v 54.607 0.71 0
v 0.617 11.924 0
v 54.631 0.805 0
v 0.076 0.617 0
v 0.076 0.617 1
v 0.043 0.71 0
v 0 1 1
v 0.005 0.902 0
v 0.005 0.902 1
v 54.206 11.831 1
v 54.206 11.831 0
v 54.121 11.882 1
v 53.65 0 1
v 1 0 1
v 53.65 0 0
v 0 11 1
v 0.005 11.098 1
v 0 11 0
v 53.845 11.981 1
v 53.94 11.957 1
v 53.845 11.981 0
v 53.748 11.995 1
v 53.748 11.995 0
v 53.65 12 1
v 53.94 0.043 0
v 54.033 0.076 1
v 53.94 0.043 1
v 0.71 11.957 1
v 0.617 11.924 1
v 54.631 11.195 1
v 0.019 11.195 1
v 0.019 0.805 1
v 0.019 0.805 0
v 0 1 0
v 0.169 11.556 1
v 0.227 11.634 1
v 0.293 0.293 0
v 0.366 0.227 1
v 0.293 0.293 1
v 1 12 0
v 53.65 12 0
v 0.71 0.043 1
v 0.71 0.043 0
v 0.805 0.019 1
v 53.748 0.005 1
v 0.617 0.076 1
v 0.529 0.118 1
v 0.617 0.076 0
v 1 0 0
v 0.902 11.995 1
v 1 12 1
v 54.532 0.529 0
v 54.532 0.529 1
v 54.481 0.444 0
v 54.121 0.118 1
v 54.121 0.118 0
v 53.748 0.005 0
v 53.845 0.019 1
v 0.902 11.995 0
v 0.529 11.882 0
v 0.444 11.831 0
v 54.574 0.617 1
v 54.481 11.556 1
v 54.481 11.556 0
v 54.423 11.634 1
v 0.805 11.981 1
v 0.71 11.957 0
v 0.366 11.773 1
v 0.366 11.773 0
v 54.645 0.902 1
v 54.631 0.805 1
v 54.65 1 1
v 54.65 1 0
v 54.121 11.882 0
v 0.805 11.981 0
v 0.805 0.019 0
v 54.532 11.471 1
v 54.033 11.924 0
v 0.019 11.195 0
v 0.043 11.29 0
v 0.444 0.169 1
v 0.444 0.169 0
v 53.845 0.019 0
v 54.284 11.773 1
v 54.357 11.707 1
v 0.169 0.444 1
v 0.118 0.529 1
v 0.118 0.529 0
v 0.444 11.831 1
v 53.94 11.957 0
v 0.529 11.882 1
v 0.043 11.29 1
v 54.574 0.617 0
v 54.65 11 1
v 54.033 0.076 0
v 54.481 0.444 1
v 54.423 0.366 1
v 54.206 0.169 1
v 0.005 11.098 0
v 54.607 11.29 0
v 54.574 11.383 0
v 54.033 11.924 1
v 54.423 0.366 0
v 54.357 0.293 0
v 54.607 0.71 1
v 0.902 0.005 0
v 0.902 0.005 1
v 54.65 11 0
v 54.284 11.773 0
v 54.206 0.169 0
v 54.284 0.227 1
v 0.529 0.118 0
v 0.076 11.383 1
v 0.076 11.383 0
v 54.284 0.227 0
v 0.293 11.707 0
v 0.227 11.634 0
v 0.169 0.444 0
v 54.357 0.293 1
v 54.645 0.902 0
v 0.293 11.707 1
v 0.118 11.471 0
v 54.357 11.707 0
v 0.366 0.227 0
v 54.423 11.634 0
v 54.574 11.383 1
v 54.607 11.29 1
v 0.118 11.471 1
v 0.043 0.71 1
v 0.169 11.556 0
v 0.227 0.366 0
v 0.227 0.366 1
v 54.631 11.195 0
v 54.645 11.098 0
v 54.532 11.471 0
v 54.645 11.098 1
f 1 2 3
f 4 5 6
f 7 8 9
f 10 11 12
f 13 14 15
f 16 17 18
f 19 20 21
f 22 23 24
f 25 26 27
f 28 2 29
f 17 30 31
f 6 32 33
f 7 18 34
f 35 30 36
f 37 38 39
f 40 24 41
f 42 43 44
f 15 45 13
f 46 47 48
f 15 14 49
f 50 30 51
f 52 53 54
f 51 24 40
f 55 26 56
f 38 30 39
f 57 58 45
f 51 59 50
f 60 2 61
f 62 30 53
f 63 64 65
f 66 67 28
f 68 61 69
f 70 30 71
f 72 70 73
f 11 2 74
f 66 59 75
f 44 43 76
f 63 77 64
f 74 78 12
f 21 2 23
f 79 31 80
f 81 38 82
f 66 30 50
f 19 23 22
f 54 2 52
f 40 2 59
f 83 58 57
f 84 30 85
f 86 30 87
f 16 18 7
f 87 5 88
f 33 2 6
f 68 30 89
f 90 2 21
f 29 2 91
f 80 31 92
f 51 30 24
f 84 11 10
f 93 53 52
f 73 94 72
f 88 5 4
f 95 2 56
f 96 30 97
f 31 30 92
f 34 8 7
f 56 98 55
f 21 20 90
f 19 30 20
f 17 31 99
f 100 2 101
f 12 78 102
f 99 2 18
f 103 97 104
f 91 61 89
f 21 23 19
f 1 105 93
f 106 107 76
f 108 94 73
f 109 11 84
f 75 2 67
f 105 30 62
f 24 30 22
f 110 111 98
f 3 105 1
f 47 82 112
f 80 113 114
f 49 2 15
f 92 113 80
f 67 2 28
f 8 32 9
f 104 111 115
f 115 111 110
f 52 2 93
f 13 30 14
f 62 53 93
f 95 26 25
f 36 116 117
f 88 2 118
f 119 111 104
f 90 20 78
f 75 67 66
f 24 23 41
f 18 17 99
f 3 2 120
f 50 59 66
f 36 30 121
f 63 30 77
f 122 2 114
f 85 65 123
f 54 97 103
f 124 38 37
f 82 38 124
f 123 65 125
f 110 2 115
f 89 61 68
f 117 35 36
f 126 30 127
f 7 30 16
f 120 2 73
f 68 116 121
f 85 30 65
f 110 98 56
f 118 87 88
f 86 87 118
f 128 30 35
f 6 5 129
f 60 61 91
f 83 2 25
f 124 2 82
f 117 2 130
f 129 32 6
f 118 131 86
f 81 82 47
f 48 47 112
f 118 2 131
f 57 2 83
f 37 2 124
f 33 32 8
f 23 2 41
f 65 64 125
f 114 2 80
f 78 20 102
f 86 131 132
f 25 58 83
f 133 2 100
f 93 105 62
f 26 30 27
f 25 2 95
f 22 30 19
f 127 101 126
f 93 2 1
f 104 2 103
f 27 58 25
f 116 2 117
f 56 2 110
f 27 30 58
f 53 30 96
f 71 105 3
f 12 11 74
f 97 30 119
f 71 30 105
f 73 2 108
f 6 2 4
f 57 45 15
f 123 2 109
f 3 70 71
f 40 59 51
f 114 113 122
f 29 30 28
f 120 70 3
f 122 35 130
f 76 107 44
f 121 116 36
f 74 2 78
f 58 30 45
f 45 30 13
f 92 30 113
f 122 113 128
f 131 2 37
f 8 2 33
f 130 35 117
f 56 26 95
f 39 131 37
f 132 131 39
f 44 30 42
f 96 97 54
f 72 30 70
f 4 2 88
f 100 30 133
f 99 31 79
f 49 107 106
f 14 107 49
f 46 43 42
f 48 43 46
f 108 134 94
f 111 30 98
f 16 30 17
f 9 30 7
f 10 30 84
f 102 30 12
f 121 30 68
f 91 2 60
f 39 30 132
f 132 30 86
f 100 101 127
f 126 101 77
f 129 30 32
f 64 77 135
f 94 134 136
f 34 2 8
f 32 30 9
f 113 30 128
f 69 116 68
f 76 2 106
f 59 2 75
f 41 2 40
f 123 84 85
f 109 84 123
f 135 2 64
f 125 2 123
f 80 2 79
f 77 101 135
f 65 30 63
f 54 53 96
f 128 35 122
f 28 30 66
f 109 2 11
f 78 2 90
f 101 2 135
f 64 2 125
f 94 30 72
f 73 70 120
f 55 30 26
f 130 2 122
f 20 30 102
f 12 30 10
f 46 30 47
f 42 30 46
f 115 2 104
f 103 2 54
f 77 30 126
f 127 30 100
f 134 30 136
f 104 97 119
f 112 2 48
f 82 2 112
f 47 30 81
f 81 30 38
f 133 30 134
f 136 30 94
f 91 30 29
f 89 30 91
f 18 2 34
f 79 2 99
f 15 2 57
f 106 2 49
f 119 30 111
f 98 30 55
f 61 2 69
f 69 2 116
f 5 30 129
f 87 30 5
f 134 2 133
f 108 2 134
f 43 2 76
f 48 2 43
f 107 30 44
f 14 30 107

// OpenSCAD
// file: ../generated/config.scad
// GENERATED by tools/build.py from config/rack.yaml — do not edit.

FRAME_W = 670.6;
FRAME_D = 225.335;
FRAME_TILT = 20;
FRAME_ROW_Y0 = 25;
FRAME_BASE_H = 80;
FRAME_TOP_Z = 410;
FRAME_PANEL_T = 7.4;
FRAME_PANEL_CLEAR = 0.2;
ROW_IDS = ["A", "B"];
ROW_HEIGHTS = [165, 165];
ROW_LAYOUTS = [[1, 1, 1, 1], [1, 1, 1, 1]];
BAY_PITCH = 165.8;
CARRIER_W = 158;
CARRIER_D = 210;
CARRIER_BOTTOM = 2.5;
CARRIER_WALL = 2;
CARRIER_STANDOFF = 5;
CARRIER_DECK = 3;
CARRIER_FASCIA = 2.5;
CARRIER_WALL_H = 20.1;
CARRIER_PLENUM = 23.1;
PCB_TO_FLOOR = 14;
CAM_MOUNT = [109, 45, 30];
CAM_LENS = [64, 27.6];
DRAWER_D = 208;
DRAWER_W = 142;
DRAWER_X0 = 8;
DRAWER_TRAVEL = 140;
DRAWER_GUIDE_W = 7.5;
DRAWER_CLEAR = 0.5;
DRAWER_BOTTOM = 2.5;
DRAWER_WALL = 2;
DRAWER_WALL_H = 16;
DRAWER_FRONT_H = 41;
DRAWER_FRONT_T = 4;
DRAWER_PLATE_GAP = [0.3, 3.2];
DISPLAY_GLASS = [52.36, 28.8];
DISPLAY_PCB = [51, 26.6];
DISPLAY_AT = [82, 8.5];
DISPLAY_SH = [12.3, 25.8];
DISPLAY_FIT = [0.3, 8.6, 3.5, 2];
DISPLAY_FRAME = [2.2, 2.5];
DRAWER_REAR_BAY = 42;
DRAWER_FLANGE = [3, 3];
DRAWER_MAGNET = [6, 3];
DRAWER_DETENT = "printed";
DATA_PORT_X = [80];
PLATE_T = 5;
HEX_PITCH = 10;
HEX_AF = 7.2;
HEX_U = 0.4;
HEX_CLEAR = 0.1;
HEX_HOLES = [[22.25, 10.418], [32.25, 10.418], [42.25, 10.418], [52.25, 10.418], [62.25, 10.418], [72.25, 10.418], [82.25, 10.418], [92.25, 10.418], [102.25, 10.418], [112.25, 10.418], [122.25, 10.418], [7.25, 19.078], [17.25, 19.078], [27.25, 19.078], [37.25, 19.078], [47.25, 19.078], [57.25, 19.078], [67.25, 19.078], [77.25, 19.078], [87.25, 19.078], [97.25, 19.078], [107.25, 19.078], [117.25, 19.078], [127.25, 19.078], [12.25, 27.738], [22.25, 27.738], [32.25, 27.738], [42.25, 27.738], [52.25, 27.738], [62.25, 27.738], [72.25, 27.738], [82.25, 27.738], [92.25, 27.738], [102.25, 27.738], [112.25, 27.738], [122.25, 27.738], [7.25, 36.399], [17.25, 36.399], [27.25, 36.399], [37.25, 36.399], [47.25, 36.399], [57.25, 36.399], [67.25, 36.399], [77.25, 36.399], [87.25, 36.399], [97.25, 36.399], [107.25, 36.399], [117.25, 36.399], [127.25, 36.399], [12.25, 45.059], [22.25, 45.059], [32.25, 45.059], [42.25, 45.059], [52.25, 45.059], [62.25, 45.059], [72.25, 45.059], [82.25, 45.059], [92.25, 45.059], [102.25, 45.059], [112.25, 45.059], [122.25, 45.059], [7.25, 53.719], [17.25, 53.719], [27.25, 53.719], [37.25, 53.719], [47.25, 53.719], [57.25, 53.719], [67.25, 53.719], [77.25, 53.719], [87.25, 53.719], [97.25, 53.719], [107.25, 53.719], [117.25, 53.719], [127.25, 53.719], [22.25, 62.379], [32.25, 62.379], [42.25, 62.379], [52.25, 62.379], [62.25, 62.379], [72.25, 62.379], [82.25, 62.379], [92.25, 62.379], [102.25, 62.379], [112.25, 62.379], [122.25, 62.379], [27.25, 71.04], [37.25, 71.04], [47.25, 71.04], [57.25, 71.04], [67.25, 71.04], [77.25, 71.04], [87.25, 71.04], [97.25, 71.04], [107.25, 71.04], [32.25, 79.7], [42.25, 79.7], [52.25, 79.7], [62.25, 79.7], [72.25, 79.7], [82.25, 79.7], [92.25, 79.7], [102.25, 79.7], [27.25, 88.36], [37.25, 88.36], [47.25, 88.36], [57.25, 88.36], [67.25, 88.36], [77.25, 88.36], [87.25, 88.36], [97.25, 88.36], [107.25, 88.36], [12.25, 97.021], [22.25, 97.021], [32.25, 97.021], [42.25, 97.021], [52.25, 97.021], [62.25, 97.021], [72.25, 97.021], [82.25, 97.021], [92.25, 97.021], [102.25, 97.021], [112.25, 97.021], [122.25, 97.021], [7.25, 105.681], [17.25, 105.681], [27.25, 105.681], [37.25, 105.681], [47.25, 105.681], [57.25, 105.681], [67.25, 105.681], [77.25, 105.681], [87.25, 105.681], [97.25, 105.681], [107.25, 105.681], [117.25, 105.681], [127.25, 105.681], [12.25, 114.341], [22.25, 114.341], [32.25, 114.341], [42.25, 114.341], [52.25, 114.341], [62.25, 114.341], [72.25, 114.341], [82.25, 114.341], [92.25, 114.341], [102.25, 114.341], [112.25, 114.341], [122.25, 114.341], [7.25, 123.001], [17.25, 123.001], [27.25, 123.001], [37.25, 123.001], [47.25, 123.001], [57.25, 123.001], [67.25, 123.001], [77.25, 123.001], [87.25, 123.001], [97.25, 123.001], [107.25, 123.001], [117.25, 123.001], [127.25, 123.001], [12.25, 131.662], [22.25, 131.662], [32.25, 131.662], [42.25, 131.662], [52.25, 131.662], [62.25, 131.662], [72.25, 131.662], [82.25, 131.662], [92.25, 131.662], [102.25, 131.662], [112.25, 131.662], [122.25, 131.662], [7.25, 140.322], [17.25, 140.322], [27.25, 140.322], [37.25, 140.322], [47.25, 140.322], [57.25, 140.322], [67.25, 140.322], [77.25, 140.322], [87.25, 140.322], [97.25, 140.322], [107.25, 140.322], [117.25, 140.322], [127.25, 140.322], [12.25, 148.982], [22.25, 148.982], [32.25, 148.982], [42.25, 148.982], [52.25, 148.982], [62.25, 148.982], [72.25, 148.982], [82.25, 148.982], [92.25, 148.982], [102.25, 148.982], [112.25, 148.982]];
HEX_ROWS = [[1, 10.418], [2, 19.078], [3, 27.738], [4, 36.399], [5, 45.059], [6, 53.719], [7, 62.379], [8, 71.04], [9, 79.7], [10, 88.36], [11, 97.021], [12, 105.681], [13, 114.341], [14, 123.001], [15, 131.662], [16, 140.322], [17, 148.982]];
PEG_STOP = [3.55, 15, 4.6, 7, 7.6];
PEG_CAM = [3, 6.75, 270, 20];
CHAIN_INNER = [7, 7];
CHAIN_OUTER = [13.5, 10.2];
CHAIN_R = 18;
CHAIN_PITCH = 16;
CHAIN_END_HOLES = [8, 4];
CHAIN_FIXED = [100, 87];
CHAIN_MOVING_X = 136;
CHAIN_FOOT_Y = 172;
CHAIN_MOVING_Y = 157;
CHAIN_END_LENGTH = 26;
CHAIN_BEND_Y = 183;
NODE_SIZE = [74, 90];
NODE_T = 1.6;
NODE_HOLES = [[3.5, 13.5], [70.5, 13.5], [3.5, 86.5], [70.5, 86.5]];
NODE_X0 = 4;
NODE_FRONT_Y = 3;
NODE_PCB_TOP = 9.1;
NODE_FRONT = [32, 12, 50];
NODE_PWR_Y = 73;
NODE_DATA_Y = 30;
NODE_AUX = [69.1, 50.6];
NODE_CAM = [59, 17.2];
DATA_PCB_SIZE = [40, 17];
DATA_PCB_T = 1.6;
DATA_PCB_HOLES = [[2.6, 13.5], [37.5, 4]];
DATA_PCB_USB = 30.5;
DATA_PCB_PH = 14.4;
DATA_X4_SIZE = [100, 37];
DATA_X4_X0 = 15;
DATA_X4_HOLES = [[3.2, 16.5], [38.7, 16.5], [81.4, 16.3]];
DATA_X4_USB = [11, 29, 47, 65];
DATA_X4_LEAD = [95.1, 20];
POD_PCB_SIZE = [40, 27];
POD_PCB_T = 1.6;
POD_PCB_HOLES = [[2.6, 13], [26.5, 23.5]];
POD_LEDS = [5, 11, 17, 23];
POD_LED_Y = 3.2;
POD_LEAD_Y = 13;
POD_HEADER = [13, 21];
HUB_SIZE = [76, 100];
HUB_HOLES = [[3.5, 3.5], [72, 4], [4, 93.5], [72, 86]];
HUB_T = 1.6;
HUB_X0 = 3.6;
HUB_FRONT_GAP = 1.2;
HUB_Z = 19;
HUB_ROWS = [81, 63.5, 46, 28.5];
HUB_LEDS = [11, 23, 35, 47, 55.6, 61.6];
HUB_USB = 70;
HUB_PD = 62;
HUB_BUTTONS = [[11.5, 10], [11.5, 16.5]];
PBOX_COLUMN = 0;
PBOX_SIZE = [84, 108, 35];
PBOX_WALL = 2.4;
PBOX_X = 3;
SA_PD = [30, 21, 1.6, 3.2];
SA_FEET = [10, 3];
// file: ../lib/common.scad
// Shared helpers for every printed part of hw-testing-rack.
include <../generated/config.scad>

$fn = $preview ? 32 : 64;
EPS = 0.01;

// Heat-set inserts (Ruthex-style).  Hole Ø is the recommended pre-hole.
INSERT_M3 = [4.0, 5.7];    // [hole Ø, depth]
INSERT_M2 = [3.2, 4.0];
INSERT_M25 = [3.6, 4.5];
M3_CLEAR = 3.4;
M5_CLEAR = 5.5;
M3_HEAD = [6.0, 3.0];      // DIN 912 / ISO 7380 head Ø × height (button head ~5.7)
// The rack's four screw types (docs/printed-parts-review.md, finding 13): M3 × 8 into inserts, nuts and
// spacers; PT 2.3 × 8 thread-forming into printed pilots; the M3 spacers; M2.5 washers
PT_PILOT = 1.9;            // a PT 2.3's pilot (≈ 0.8 × d)
PT_CLEAR = 2.6;            // and its clearance hole

module rbox(size, r = 2, center = false) {
    // Box with rounded vertical edges.
    translate(center ? [-size[0] / 2, -size[1] / 2, 0] : [0, 0, 0])
        hull() for (x = [r, size[0] - r], y = [r, size[1] - r])
            translate([x, y, 0]) cylinder(r = r, h = size[2]);
}

module rslot(len, w, h) {
    // Stadium-shaped slot along X, centred on the origin.
    hull() for (x = [-(len - w) / 2, (len - w) / 2]) translate([x, 0, 0]) cylinder(d = w, h = h);
}

module insert_hole(spec = INSERT_M3, runout = 0) {
    // Pocket for a heat-set insert, opening at z=0 and going -Z; `runout`: an M3 clearance hole that
    // carries on past it, so an M3 × 8 that goes deeper than the insert doesn't bottom on the plastic
    translate([0, 0, -spec[1]]) cylinder(d = spec[0], h = spec[1] + EPS);
    translate([0, 0, -0.6]) cylinder(d1 = spec[0], d2 = spec[0] + 0.8, h = 0.6 + EPS);
    if (runout > 0) translate([0, 0, -spec[1] - runout]) cylinder(d = M3_CLEAR, h = runout + EPS);
}

module screw_through(d = M3_CLEAR, h = 20, head = M3_HEAD, counterbore = true) {
    // Clearance hole along +Z from z=0, with an optional counterbore at z=h.
    translate([0, 0, -EPS]) cylinder(d = d, h = h + 2 * EPS);
    if (counterbore) translate([0, 0, h - head[1]]) cylinder(d = head[0] + 0.4, h = head[1] + EPS);
}

module magnet_pocket(d = DRAWER_MAGNET[0], t = DRAWER_MAGNET[1]) {
    // Slip-fit pocket for a glued disc magnet (docs/mechanical.md), opening at z=0 going -Z.
    translate([0, 0, -t - 0.2]) cylinder(d = d + 0.25, h = t + 0.2 + EPS);
}

module label_text(txt, size = 6, depth = 0.6, font = "Liberation Sans:style=Bold") {
    linear_extrude(depth) text(txt, size = size, font = font, halign = "center", valign = "center");
}


// ---------------------------------------------------------------- the visual language
// One set of rules for every part (docs/printed-parts-review.md › The visual language): R3 on the outer
// vertical edges of big parts, R1.5 on small ones; a 0.5 × 45° chamfer on the visible bed edges (it hides the
// elephant's foot); a 0.8 round on free top edges; text debossed 0.6 mm in Liberation Sans Bold, capitals at
// least 4.5 mm on a horizontal face, 5.5 on a vertical one.
VL_R = [3, 1.5];
VL_CHAMFER = 0.5;
VL_FILLET = 0.8;
VL_DEPTH = 0.6;
function vl_size(cap) = cap / 0.955;      // OpenSCAD's text size for a capital height (Liberation Sans Bold)

// cutters for a straight edge along +X from the origin, `len` long, between the faces y = 0 and z = 0 with
// the material at y >= 0, z >= 0: a 45° chamfer c, or a round of radius r.  Rotate / mirror them onto an edge
module edge_chamfer(len, c = VL_CHAMFER) translate([-EPS, 0, 0]) rotate([90, 0, 90]) linear_extrude(len + 2 * EPS)
    polygon([[-1, -1], [c, -1], [c, -EPS], [-EPS, c], [-1, c]]);
module edge_round(len, r = VL_FILLET) translate([-EPS, 0, 0]) rotate([90, 0, 90]) linear_extrude(len + 2 * EPS)
    difference() { translate([-1, -1]) square([r + 1, r + 1]); translate([r, r]) circle(r = r, $fn = 32); }

// text debossed into a face: lay it in the XY plane at the face (z = 0), reading from +Z; it goes `depth` down
module deboss(t, cap = 4.5, depth = VL_DEPTH, halign = "center", valign = "center")
    translate([0, 0, -depth]) linear_extrude(depth + EPS)
        text(t, size = vl_size(cap), font = "Liberation Sans:style=Bold", halign = halign, valign = valign);
// main file
// Bay label for the drawer front's label recess (LABEL_RECESS_W × 12.4 × 0.9, 70.7 wide with the display): 16 mm
// shorter, 12 × 1.0, the bay's ID in 7 mm capitals debossed 0.8 mm into the face that shows and filled by the
// H2D's second nozzle, flush: one object,
// two colours (docs/printed-parts-review.md, finding 12).  That face prints on the bed, the crispest there is,
// so the text is mirrored here and reads right on the drawer.  The two parts register:
//
//   openscad -D 'ID="B3"' -D 'PART="body"'  -o bay_label_b3.stl       parts/label.scad
//   openscad -D 'ID="B3"' -D 'PART="inlay"' -o bay_label_b3_inlay.stl parts/label.scad
//
// In Bambu Studio, load both files at once and answer "yes" to loading them as one object with multiple
// parts; give the inlay the light filament (docs/mechanical.md).  No ID: a blank, for 12 mm tape instead.
include <../lib/carrier.scad>

ID = "";
PART = "body";                          // body | inlay
SIZE = [LABEL_RECESS_W - 16, 12, 1.0];
TEXT = [7.3, 0.8];                      // text size (7 mm capitals, Liberation Sans Bold), depth

module id_2d() translate([SIZE[0] / 2, SIZE[1] / 2]) mirror([1, 0])
    text(ID, size = TEXT[0], font = "Liberation Sans:style=Bold", halign = "center", valign = "center");

if (PART == "inlay") linear_extrude(TEXT[1]) id_2d();
else difference() {
    rbox(SIZE, r = 1);
    if (ID != "") translate([0, 0, -EPS]) linear_extrude(TEXT[1] + EPS) id_2d();
}
